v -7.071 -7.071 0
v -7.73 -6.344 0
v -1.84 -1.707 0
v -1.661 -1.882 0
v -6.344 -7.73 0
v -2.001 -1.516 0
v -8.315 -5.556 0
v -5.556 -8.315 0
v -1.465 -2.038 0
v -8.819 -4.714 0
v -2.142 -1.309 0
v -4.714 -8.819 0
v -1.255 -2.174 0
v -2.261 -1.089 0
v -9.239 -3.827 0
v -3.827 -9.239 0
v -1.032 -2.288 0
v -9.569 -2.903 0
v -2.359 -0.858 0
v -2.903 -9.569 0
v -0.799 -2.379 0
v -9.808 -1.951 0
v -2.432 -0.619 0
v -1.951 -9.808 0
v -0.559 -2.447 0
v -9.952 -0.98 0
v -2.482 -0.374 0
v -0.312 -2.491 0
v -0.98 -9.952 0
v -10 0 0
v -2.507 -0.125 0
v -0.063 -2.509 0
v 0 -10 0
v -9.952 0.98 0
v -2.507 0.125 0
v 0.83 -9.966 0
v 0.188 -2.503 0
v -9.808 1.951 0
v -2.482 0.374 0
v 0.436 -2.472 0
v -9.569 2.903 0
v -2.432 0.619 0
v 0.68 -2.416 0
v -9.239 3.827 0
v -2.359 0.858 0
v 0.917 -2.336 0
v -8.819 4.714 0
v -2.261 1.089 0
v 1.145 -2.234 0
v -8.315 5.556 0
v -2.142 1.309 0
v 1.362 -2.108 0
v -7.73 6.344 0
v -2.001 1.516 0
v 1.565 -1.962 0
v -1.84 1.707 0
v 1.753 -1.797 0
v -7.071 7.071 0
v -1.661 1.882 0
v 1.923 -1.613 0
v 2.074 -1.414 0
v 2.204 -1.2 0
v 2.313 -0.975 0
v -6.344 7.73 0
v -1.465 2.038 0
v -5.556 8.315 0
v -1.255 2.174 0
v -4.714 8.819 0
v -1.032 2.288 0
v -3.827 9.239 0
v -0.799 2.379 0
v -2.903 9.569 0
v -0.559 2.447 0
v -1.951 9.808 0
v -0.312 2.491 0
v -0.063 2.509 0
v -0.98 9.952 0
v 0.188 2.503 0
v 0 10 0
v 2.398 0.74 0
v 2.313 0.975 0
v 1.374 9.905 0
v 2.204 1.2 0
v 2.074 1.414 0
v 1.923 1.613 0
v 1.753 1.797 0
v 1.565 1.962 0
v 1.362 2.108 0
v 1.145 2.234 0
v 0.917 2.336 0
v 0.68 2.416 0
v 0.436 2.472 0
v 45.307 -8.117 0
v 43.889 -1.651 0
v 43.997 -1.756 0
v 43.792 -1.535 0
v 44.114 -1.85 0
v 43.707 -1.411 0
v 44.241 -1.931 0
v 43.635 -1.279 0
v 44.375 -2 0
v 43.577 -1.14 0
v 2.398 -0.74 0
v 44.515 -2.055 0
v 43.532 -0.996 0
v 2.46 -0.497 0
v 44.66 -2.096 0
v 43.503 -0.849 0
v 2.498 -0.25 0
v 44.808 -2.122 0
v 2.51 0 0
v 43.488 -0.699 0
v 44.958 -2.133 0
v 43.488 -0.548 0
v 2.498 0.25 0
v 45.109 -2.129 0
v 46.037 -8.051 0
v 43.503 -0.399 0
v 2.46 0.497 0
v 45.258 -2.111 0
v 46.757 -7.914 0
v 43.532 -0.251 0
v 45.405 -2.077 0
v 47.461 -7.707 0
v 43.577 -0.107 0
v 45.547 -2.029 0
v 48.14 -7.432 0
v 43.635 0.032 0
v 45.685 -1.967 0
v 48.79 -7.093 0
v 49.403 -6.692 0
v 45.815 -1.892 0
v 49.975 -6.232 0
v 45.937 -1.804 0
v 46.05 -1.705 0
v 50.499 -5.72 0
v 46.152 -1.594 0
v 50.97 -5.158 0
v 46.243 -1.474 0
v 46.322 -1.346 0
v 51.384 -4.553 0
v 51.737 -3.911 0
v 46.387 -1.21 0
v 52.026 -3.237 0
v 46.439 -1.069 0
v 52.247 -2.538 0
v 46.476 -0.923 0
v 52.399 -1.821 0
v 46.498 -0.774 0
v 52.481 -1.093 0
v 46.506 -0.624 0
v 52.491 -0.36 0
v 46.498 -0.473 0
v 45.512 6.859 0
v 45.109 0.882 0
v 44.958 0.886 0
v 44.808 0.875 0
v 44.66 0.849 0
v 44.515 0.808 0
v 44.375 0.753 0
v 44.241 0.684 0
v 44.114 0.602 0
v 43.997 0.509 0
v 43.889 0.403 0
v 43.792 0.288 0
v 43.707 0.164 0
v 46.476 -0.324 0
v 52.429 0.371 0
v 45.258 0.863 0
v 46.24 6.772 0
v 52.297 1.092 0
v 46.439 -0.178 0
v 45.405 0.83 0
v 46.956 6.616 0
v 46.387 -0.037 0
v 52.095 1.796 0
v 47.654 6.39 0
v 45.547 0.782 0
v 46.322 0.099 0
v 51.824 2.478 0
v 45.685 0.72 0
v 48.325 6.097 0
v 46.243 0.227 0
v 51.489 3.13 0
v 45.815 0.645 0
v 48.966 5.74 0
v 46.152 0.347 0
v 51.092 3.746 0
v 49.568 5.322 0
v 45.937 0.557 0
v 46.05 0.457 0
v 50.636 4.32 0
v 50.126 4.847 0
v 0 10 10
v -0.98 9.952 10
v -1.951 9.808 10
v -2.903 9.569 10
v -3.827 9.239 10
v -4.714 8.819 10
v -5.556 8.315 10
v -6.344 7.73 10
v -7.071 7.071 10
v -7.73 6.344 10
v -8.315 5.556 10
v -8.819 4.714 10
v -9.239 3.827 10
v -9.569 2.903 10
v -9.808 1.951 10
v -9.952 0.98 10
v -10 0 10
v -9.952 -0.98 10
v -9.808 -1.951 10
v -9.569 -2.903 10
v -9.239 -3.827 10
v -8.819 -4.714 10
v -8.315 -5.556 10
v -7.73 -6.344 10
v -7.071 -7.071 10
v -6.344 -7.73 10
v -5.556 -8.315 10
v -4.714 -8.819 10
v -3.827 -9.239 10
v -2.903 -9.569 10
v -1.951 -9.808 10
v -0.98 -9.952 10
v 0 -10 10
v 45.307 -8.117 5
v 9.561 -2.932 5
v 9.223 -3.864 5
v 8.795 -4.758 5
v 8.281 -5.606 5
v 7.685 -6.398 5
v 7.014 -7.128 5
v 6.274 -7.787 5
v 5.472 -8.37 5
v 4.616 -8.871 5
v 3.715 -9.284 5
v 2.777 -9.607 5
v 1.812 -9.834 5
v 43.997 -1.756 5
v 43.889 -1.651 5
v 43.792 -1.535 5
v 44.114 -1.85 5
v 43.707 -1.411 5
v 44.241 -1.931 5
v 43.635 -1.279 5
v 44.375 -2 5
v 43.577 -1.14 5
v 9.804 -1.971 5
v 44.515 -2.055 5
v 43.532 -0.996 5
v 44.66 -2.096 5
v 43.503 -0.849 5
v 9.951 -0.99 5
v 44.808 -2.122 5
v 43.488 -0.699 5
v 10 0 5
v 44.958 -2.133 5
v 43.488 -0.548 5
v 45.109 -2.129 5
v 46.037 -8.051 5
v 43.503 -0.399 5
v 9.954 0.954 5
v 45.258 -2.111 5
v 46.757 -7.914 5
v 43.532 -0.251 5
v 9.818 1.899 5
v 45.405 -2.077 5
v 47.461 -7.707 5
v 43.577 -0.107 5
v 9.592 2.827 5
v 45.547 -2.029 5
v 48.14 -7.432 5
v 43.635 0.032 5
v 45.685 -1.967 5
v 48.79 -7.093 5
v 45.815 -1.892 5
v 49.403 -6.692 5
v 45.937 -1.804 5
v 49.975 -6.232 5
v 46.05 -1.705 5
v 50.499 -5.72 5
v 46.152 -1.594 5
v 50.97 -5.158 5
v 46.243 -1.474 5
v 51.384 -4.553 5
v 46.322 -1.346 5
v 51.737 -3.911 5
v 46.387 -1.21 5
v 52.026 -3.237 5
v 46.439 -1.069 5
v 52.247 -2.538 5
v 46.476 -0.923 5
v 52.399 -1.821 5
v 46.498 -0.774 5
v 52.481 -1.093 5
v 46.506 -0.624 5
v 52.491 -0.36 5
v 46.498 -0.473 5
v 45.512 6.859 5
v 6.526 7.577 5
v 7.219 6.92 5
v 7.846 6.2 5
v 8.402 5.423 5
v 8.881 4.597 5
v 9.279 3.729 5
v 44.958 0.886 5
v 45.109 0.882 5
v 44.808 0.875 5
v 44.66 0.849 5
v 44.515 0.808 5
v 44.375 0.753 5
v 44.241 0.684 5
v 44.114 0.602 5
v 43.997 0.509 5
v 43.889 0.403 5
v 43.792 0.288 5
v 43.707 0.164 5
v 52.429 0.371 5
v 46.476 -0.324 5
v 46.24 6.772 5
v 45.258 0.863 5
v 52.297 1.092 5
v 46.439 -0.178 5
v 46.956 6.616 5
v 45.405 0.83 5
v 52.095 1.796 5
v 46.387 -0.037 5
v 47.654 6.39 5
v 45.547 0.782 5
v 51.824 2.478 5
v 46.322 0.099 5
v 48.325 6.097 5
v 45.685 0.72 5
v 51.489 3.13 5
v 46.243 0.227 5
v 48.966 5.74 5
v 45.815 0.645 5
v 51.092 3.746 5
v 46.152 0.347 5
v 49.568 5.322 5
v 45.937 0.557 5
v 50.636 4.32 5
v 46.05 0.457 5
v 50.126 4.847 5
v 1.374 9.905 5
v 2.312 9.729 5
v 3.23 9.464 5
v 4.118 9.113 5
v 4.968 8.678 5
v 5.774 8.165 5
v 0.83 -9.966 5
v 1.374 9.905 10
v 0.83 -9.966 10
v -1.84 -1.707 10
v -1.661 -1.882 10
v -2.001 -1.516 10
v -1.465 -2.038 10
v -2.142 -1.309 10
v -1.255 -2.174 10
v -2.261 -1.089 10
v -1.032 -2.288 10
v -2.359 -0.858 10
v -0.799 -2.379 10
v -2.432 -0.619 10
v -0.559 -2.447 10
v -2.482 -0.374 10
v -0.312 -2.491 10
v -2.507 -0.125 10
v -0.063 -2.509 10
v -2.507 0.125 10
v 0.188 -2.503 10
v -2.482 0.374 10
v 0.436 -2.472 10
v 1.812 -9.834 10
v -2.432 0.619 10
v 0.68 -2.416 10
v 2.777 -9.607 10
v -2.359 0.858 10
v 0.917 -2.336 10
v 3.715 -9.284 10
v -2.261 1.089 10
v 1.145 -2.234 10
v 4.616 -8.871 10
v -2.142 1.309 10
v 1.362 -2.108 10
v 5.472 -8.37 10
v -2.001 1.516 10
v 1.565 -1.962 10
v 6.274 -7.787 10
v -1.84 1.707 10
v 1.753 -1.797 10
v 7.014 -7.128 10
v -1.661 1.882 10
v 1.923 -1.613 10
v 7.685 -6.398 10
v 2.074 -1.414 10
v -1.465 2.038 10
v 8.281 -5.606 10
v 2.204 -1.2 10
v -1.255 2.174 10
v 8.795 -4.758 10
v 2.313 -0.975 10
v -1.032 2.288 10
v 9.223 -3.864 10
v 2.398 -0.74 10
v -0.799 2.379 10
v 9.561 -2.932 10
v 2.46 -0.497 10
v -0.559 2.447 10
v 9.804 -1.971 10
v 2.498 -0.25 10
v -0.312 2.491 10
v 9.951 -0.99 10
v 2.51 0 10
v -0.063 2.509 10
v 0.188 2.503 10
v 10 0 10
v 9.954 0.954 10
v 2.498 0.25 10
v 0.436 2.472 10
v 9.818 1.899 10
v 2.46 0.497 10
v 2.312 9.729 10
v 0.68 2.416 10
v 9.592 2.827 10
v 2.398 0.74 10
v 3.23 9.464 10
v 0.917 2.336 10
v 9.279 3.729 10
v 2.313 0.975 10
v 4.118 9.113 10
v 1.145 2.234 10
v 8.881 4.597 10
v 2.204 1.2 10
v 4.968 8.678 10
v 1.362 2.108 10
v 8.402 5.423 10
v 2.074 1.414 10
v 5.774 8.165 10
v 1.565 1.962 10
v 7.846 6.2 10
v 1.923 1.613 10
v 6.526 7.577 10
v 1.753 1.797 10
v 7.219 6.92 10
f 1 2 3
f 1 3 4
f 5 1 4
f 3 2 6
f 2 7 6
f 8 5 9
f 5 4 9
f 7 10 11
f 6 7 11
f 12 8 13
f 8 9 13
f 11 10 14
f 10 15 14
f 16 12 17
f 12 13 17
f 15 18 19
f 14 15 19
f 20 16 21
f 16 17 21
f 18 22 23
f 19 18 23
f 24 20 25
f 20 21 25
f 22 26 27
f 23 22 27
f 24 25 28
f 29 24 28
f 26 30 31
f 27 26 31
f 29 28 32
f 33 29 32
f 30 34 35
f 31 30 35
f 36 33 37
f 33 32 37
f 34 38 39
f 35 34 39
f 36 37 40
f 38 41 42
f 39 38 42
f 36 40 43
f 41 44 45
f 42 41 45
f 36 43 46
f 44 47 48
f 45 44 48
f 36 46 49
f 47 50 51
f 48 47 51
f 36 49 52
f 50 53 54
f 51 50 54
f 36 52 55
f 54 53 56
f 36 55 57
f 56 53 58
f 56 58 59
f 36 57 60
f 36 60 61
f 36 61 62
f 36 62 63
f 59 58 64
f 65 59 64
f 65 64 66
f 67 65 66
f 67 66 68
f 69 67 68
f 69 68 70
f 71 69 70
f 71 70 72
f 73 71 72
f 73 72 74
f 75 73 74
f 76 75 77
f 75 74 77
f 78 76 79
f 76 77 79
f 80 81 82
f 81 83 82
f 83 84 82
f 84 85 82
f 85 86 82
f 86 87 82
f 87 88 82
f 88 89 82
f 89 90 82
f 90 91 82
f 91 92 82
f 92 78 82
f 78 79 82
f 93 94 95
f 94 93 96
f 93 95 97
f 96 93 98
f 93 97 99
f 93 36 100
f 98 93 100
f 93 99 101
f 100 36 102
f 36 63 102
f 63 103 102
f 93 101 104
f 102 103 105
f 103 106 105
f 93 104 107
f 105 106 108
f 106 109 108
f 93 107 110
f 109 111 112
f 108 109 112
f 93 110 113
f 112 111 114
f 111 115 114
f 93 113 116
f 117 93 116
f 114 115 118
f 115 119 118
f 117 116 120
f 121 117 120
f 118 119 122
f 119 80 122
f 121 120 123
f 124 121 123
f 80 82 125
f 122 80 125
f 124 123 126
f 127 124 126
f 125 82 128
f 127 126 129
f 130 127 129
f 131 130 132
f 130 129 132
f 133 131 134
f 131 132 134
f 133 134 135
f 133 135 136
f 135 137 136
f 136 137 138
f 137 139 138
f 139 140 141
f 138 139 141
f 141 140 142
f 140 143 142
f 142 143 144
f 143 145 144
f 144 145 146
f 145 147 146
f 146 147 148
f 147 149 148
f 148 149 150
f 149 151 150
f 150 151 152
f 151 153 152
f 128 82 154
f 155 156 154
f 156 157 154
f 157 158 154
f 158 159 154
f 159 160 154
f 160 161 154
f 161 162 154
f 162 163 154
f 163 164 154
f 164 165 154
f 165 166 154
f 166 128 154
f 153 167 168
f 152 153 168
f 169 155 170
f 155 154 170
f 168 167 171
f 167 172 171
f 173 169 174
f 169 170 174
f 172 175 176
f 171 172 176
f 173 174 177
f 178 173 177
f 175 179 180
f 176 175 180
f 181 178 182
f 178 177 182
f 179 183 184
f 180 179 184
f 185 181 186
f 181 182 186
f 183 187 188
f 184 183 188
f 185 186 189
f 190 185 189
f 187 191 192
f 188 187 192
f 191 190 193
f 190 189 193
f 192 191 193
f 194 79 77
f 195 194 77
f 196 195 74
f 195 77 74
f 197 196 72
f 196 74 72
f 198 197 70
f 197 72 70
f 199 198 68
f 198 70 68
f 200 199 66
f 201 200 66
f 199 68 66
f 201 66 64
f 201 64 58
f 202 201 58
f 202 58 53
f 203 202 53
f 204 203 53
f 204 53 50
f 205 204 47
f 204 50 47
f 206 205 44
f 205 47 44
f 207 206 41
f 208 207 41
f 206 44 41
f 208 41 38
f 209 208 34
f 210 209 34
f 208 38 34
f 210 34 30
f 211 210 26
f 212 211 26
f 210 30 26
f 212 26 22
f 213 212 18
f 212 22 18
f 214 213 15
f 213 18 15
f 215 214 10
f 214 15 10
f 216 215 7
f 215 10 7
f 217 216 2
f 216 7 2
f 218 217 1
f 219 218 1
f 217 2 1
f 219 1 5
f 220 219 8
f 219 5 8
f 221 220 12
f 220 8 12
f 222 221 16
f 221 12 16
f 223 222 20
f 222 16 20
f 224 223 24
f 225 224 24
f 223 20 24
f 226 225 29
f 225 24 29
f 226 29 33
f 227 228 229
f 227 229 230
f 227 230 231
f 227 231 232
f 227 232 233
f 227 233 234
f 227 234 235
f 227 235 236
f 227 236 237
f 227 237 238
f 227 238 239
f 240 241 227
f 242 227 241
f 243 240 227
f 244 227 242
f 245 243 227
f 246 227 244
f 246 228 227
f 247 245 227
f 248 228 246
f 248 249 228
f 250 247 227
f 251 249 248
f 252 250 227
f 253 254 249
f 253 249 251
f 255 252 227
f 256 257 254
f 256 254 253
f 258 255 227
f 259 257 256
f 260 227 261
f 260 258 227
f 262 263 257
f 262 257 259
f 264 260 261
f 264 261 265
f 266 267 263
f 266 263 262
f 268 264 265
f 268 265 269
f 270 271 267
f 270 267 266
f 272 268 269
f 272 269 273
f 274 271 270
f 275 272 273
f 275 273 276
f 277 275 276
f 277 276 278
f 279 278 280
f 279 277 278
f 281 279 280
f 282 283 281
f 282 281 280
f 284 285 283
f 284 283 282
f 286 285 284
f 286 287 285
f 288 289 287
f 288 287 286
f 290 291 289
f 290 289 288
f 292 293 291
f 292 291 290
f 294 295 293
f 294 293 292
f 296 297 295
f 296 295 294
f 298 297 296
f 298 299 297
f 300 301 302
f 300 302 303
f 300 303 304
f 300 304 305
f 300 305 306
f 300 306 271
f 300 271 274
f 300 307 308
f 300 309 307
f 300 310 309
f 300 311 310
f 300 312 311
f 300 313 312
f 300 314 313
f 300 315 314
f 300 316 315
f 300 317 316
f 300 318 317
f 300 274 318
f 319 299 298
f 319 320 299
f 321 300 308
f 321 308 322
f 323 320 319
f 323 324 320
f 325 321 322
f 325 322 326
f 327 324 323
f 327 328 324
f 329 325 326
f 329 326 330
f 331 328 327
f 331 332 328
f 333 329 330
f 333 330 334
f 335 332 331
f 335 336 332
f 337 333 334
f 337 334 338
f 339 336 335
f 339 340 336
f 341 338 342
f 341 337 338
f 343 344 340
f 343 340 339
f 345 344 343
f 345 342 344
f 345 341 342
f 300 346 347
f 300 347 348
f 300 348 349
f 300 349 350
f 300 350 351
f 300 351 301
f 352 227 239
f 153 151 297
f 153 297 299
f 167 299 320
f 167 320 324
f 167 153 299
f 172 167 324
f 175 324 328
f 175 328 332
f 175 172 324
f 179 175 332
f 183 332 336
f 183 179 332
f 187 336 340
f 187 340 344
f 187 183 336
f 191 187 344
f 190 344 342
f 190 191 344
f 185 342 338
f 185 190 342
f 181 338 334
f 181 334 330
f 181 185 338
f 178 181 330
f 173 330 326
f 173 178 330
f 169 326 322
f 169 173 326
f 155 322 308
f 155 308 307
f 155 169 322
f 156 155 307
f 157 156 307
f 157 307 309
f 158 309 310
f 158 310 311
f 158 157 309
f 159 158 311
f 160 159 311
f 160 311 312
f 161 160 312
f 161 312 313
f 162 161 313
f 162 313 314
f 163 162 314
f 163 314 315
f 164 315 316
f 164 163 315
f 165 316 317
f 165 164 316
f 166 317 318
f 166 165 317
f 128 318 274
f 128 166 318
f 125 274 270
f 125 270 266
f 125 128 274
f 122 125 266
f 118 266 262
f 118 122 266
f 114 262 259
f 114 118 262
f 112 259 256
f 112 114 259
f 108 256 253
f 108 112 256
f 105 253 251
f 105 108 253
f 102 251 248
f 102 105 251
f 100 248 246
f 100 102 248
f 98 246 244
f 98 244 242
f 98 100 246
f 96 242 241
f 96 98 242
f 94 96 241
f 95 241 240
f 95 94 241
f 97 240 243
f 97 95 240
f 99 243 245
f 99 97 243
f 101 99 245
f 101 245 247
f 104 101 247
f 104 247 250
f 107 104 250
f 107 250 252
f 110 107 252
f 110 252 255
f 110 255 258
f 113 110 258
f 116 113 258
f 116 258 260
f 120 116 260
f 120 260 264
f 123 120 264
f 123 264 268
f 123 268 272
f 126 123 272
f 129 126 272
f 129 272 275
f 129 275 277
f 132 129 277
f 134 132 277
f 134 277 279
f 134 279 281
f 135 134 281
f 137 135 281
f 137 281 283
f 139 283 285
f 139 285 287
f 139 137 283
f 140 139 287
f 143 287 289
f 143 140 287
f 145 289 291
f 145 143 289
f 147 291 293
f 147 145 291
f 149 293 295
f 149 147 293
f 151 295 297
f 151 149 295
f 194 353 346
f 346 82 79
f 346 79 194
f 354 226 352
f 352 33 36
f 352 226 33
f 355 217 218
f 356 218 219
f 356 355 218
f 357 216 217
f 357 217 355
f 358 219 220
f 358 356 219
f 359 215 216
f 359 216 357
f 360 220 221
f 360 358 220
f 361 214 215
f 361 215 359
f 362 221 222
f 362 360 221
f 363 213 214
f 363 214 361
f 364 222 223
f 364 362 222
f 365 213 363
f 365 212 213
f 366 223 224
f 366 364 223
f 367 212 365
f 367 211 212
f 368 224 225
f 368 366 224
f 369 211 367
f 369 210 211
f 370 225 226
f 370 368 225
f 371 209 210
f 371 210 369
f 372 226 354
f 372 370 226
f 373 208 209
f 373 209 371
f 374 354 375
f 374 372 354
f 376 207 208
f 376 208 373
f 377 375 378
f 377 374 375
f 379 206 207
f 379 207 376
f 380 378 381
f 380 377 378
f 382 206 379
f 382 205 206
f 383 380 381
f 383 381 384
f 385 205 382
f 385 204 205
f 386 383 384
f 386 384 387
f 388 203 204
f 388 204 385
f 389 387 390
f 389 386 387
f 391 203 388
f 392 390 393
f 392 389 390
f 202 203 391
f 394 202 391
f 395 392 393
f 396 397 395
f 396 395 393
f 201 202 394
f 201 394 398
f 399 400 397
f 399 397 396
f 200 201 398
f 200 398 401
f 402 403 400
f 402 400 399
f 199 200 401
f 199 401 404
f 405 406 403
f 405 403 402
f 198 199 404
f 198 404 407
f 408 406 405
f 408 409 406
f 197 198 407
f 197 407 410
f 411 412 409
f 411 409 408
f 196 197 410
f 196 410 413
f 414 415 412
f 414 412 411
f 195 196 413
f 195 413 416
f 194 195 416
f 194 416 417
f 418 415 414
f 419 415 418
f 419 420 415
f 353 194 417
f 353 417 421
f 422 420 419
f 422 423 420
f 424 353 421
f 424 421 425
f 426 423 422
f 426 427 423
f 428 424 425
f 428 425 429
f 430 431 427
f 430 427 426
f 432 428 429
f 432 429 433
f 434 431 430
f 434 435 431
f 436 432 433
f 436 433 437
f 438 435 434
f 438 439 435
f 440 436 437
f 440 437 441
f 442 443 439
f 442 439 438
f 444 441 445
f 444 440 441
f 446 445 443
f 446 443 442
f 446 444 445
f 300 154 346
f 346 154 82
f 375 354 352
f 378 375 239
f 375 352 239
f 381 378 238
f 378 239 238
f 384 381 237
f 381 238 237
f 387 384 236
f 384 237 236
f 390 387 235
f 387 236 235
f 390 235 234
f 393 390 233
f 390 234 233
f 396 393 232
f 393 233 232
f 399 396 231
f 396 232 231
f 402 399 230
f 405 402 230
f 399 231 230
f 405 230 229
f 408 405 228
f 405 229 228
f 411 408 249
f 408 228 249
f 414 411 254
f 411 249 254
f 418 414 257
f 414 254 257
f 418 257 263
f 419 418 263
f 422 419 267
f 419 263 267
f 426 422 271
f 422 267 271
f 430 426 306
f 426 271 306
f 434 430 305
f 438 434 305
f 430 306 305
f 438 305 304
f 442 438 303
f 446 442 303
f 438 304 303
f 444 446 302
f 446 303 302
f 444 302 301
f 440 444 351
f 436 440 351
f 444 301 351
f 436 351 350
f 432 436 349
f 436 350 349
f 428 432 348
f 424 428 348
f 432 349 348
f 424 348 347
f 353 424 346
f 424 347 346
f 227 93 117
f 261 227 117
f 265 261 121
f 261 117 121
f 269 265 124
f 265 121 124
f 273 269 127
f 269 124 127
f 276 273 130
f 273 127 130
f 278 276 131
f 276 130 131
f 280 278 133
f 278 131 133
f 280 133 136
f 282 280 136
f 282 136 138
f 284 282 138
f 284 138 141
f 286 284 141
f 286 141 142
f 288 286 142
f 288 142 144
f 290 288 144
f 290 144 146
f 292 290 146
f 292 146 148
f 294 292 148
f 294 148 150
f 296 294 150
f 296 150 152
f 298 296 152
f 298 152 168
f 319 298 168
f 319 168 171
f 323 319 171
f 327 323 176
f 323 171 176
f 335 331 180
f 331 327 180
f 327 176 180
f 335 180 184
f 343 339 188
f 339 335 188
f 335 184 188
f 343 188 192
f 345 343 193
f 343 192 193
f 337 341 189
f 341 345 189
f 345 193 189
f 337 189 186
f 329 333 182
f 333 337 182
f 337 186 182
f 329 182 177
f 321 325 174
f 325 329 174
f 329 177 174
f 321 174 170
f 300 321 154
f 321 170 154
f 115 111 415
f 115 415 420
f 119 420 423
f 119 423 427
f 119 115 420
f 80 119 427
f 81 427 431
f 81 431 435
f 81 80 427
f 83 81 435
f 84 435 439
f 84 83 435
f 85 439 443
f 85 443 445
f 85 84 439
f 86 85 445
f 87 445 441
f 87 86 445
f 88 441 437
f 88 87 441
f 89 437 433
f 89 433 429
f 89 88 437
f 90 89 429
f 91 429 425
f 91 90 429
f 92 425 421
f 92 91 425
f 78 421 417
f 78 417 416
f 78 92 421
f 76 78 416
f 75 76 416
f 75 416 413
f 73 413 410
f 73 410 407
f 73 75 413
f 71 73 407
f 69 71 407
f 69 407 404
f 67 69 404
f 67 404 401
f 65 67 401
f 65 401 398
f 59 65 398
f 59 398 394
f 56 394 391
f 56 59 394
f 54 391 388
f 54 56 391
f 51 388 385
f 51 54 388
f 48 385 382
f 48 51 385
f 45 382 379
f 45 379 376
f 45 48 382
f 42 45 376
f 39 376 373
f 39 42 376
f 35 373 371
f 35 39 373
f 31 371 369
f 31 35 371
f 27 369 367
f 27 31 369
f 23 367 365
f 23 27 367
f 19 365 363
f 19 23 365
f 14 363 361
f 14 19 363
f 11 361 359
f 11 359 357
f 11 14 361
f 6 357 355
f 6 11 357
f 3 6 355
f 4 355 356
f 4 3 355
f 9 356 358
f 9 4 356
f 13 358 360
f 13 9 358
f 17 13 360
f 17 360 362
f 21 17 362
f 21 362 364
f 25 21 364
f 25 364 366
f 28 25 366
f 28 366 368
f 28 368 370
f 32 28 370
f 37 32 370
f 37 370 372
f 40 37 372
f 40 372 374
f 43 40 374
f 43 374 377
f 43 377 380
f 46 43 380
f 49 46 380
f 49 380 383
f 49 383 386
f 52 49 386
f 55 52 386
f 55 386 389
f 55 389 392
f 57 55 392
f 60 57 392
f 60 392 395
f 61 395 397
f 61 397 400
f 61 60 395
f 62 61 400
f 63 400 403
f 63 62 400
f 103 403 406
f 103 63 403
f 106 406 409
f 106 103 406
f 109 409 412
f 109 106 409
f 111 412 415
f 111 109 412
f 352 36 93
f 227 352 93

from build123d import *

# Parameters (mm, degrees)
SKETCH1_R           = 2.51
BOSS_EXTRUDE1_DEPTH = 10
SKETCH1_3_R         = 1.51
BOSS_EXTRUDE2_DEPTH = 5


with BuildPart() as part:
    # Sketch1 → Boss-Extrude1 (new body)
    with BuildSketch(Plane.XY):
        with BuildLine():
            Line((1.373905706, 9.905169514), (0, 10))
            ThreePointArc((0, 10), (-10, 0), (0, -10))
            Line((0, -10), (0.829742277, -9.965516934))
            ThreePointArc((0.829742277, -9.965516934), (7.3585808, -6.771357959), (10, 0))
            ThreePointArc((10, 0), (7.541188801, 6.567379346), (1.373905706, 9.905169514))
        make_face()
        Circle(SKETCH1_R, mode=Mode.SUBTRACT)
    extrude(amount=BOSS_EXTRUDE1_DEPTH)

    # Sketch1<3> → Boss-Extrude2 (add)
    with BuildSketch(Plane.XY):
        with BuildLine():
            Line((45.512119929, 6.858637088), (1.373905706, 9.905169514))
            ThreePointArc((1.373905706, 9.905169514), (9.996252352, -0.273749725), (0.829742277, -9.965516934))
            Line((0.829742277, -9.965516934), (45.307101416, -8.117092704))
            ThreePointArc((45.307101416, -8.117092704), (52.49497676, -0.726226835), (45.512119929, 6.858637088))
        make_face()
        with Locations((44.995679477, -0.623561069)):
            Circle(SKETCH1_3_R, mode=Mode.SUBTRACT)
    extrude(amount=BOSS_EXTRUDE2_DEPTH)


solid = part.part
